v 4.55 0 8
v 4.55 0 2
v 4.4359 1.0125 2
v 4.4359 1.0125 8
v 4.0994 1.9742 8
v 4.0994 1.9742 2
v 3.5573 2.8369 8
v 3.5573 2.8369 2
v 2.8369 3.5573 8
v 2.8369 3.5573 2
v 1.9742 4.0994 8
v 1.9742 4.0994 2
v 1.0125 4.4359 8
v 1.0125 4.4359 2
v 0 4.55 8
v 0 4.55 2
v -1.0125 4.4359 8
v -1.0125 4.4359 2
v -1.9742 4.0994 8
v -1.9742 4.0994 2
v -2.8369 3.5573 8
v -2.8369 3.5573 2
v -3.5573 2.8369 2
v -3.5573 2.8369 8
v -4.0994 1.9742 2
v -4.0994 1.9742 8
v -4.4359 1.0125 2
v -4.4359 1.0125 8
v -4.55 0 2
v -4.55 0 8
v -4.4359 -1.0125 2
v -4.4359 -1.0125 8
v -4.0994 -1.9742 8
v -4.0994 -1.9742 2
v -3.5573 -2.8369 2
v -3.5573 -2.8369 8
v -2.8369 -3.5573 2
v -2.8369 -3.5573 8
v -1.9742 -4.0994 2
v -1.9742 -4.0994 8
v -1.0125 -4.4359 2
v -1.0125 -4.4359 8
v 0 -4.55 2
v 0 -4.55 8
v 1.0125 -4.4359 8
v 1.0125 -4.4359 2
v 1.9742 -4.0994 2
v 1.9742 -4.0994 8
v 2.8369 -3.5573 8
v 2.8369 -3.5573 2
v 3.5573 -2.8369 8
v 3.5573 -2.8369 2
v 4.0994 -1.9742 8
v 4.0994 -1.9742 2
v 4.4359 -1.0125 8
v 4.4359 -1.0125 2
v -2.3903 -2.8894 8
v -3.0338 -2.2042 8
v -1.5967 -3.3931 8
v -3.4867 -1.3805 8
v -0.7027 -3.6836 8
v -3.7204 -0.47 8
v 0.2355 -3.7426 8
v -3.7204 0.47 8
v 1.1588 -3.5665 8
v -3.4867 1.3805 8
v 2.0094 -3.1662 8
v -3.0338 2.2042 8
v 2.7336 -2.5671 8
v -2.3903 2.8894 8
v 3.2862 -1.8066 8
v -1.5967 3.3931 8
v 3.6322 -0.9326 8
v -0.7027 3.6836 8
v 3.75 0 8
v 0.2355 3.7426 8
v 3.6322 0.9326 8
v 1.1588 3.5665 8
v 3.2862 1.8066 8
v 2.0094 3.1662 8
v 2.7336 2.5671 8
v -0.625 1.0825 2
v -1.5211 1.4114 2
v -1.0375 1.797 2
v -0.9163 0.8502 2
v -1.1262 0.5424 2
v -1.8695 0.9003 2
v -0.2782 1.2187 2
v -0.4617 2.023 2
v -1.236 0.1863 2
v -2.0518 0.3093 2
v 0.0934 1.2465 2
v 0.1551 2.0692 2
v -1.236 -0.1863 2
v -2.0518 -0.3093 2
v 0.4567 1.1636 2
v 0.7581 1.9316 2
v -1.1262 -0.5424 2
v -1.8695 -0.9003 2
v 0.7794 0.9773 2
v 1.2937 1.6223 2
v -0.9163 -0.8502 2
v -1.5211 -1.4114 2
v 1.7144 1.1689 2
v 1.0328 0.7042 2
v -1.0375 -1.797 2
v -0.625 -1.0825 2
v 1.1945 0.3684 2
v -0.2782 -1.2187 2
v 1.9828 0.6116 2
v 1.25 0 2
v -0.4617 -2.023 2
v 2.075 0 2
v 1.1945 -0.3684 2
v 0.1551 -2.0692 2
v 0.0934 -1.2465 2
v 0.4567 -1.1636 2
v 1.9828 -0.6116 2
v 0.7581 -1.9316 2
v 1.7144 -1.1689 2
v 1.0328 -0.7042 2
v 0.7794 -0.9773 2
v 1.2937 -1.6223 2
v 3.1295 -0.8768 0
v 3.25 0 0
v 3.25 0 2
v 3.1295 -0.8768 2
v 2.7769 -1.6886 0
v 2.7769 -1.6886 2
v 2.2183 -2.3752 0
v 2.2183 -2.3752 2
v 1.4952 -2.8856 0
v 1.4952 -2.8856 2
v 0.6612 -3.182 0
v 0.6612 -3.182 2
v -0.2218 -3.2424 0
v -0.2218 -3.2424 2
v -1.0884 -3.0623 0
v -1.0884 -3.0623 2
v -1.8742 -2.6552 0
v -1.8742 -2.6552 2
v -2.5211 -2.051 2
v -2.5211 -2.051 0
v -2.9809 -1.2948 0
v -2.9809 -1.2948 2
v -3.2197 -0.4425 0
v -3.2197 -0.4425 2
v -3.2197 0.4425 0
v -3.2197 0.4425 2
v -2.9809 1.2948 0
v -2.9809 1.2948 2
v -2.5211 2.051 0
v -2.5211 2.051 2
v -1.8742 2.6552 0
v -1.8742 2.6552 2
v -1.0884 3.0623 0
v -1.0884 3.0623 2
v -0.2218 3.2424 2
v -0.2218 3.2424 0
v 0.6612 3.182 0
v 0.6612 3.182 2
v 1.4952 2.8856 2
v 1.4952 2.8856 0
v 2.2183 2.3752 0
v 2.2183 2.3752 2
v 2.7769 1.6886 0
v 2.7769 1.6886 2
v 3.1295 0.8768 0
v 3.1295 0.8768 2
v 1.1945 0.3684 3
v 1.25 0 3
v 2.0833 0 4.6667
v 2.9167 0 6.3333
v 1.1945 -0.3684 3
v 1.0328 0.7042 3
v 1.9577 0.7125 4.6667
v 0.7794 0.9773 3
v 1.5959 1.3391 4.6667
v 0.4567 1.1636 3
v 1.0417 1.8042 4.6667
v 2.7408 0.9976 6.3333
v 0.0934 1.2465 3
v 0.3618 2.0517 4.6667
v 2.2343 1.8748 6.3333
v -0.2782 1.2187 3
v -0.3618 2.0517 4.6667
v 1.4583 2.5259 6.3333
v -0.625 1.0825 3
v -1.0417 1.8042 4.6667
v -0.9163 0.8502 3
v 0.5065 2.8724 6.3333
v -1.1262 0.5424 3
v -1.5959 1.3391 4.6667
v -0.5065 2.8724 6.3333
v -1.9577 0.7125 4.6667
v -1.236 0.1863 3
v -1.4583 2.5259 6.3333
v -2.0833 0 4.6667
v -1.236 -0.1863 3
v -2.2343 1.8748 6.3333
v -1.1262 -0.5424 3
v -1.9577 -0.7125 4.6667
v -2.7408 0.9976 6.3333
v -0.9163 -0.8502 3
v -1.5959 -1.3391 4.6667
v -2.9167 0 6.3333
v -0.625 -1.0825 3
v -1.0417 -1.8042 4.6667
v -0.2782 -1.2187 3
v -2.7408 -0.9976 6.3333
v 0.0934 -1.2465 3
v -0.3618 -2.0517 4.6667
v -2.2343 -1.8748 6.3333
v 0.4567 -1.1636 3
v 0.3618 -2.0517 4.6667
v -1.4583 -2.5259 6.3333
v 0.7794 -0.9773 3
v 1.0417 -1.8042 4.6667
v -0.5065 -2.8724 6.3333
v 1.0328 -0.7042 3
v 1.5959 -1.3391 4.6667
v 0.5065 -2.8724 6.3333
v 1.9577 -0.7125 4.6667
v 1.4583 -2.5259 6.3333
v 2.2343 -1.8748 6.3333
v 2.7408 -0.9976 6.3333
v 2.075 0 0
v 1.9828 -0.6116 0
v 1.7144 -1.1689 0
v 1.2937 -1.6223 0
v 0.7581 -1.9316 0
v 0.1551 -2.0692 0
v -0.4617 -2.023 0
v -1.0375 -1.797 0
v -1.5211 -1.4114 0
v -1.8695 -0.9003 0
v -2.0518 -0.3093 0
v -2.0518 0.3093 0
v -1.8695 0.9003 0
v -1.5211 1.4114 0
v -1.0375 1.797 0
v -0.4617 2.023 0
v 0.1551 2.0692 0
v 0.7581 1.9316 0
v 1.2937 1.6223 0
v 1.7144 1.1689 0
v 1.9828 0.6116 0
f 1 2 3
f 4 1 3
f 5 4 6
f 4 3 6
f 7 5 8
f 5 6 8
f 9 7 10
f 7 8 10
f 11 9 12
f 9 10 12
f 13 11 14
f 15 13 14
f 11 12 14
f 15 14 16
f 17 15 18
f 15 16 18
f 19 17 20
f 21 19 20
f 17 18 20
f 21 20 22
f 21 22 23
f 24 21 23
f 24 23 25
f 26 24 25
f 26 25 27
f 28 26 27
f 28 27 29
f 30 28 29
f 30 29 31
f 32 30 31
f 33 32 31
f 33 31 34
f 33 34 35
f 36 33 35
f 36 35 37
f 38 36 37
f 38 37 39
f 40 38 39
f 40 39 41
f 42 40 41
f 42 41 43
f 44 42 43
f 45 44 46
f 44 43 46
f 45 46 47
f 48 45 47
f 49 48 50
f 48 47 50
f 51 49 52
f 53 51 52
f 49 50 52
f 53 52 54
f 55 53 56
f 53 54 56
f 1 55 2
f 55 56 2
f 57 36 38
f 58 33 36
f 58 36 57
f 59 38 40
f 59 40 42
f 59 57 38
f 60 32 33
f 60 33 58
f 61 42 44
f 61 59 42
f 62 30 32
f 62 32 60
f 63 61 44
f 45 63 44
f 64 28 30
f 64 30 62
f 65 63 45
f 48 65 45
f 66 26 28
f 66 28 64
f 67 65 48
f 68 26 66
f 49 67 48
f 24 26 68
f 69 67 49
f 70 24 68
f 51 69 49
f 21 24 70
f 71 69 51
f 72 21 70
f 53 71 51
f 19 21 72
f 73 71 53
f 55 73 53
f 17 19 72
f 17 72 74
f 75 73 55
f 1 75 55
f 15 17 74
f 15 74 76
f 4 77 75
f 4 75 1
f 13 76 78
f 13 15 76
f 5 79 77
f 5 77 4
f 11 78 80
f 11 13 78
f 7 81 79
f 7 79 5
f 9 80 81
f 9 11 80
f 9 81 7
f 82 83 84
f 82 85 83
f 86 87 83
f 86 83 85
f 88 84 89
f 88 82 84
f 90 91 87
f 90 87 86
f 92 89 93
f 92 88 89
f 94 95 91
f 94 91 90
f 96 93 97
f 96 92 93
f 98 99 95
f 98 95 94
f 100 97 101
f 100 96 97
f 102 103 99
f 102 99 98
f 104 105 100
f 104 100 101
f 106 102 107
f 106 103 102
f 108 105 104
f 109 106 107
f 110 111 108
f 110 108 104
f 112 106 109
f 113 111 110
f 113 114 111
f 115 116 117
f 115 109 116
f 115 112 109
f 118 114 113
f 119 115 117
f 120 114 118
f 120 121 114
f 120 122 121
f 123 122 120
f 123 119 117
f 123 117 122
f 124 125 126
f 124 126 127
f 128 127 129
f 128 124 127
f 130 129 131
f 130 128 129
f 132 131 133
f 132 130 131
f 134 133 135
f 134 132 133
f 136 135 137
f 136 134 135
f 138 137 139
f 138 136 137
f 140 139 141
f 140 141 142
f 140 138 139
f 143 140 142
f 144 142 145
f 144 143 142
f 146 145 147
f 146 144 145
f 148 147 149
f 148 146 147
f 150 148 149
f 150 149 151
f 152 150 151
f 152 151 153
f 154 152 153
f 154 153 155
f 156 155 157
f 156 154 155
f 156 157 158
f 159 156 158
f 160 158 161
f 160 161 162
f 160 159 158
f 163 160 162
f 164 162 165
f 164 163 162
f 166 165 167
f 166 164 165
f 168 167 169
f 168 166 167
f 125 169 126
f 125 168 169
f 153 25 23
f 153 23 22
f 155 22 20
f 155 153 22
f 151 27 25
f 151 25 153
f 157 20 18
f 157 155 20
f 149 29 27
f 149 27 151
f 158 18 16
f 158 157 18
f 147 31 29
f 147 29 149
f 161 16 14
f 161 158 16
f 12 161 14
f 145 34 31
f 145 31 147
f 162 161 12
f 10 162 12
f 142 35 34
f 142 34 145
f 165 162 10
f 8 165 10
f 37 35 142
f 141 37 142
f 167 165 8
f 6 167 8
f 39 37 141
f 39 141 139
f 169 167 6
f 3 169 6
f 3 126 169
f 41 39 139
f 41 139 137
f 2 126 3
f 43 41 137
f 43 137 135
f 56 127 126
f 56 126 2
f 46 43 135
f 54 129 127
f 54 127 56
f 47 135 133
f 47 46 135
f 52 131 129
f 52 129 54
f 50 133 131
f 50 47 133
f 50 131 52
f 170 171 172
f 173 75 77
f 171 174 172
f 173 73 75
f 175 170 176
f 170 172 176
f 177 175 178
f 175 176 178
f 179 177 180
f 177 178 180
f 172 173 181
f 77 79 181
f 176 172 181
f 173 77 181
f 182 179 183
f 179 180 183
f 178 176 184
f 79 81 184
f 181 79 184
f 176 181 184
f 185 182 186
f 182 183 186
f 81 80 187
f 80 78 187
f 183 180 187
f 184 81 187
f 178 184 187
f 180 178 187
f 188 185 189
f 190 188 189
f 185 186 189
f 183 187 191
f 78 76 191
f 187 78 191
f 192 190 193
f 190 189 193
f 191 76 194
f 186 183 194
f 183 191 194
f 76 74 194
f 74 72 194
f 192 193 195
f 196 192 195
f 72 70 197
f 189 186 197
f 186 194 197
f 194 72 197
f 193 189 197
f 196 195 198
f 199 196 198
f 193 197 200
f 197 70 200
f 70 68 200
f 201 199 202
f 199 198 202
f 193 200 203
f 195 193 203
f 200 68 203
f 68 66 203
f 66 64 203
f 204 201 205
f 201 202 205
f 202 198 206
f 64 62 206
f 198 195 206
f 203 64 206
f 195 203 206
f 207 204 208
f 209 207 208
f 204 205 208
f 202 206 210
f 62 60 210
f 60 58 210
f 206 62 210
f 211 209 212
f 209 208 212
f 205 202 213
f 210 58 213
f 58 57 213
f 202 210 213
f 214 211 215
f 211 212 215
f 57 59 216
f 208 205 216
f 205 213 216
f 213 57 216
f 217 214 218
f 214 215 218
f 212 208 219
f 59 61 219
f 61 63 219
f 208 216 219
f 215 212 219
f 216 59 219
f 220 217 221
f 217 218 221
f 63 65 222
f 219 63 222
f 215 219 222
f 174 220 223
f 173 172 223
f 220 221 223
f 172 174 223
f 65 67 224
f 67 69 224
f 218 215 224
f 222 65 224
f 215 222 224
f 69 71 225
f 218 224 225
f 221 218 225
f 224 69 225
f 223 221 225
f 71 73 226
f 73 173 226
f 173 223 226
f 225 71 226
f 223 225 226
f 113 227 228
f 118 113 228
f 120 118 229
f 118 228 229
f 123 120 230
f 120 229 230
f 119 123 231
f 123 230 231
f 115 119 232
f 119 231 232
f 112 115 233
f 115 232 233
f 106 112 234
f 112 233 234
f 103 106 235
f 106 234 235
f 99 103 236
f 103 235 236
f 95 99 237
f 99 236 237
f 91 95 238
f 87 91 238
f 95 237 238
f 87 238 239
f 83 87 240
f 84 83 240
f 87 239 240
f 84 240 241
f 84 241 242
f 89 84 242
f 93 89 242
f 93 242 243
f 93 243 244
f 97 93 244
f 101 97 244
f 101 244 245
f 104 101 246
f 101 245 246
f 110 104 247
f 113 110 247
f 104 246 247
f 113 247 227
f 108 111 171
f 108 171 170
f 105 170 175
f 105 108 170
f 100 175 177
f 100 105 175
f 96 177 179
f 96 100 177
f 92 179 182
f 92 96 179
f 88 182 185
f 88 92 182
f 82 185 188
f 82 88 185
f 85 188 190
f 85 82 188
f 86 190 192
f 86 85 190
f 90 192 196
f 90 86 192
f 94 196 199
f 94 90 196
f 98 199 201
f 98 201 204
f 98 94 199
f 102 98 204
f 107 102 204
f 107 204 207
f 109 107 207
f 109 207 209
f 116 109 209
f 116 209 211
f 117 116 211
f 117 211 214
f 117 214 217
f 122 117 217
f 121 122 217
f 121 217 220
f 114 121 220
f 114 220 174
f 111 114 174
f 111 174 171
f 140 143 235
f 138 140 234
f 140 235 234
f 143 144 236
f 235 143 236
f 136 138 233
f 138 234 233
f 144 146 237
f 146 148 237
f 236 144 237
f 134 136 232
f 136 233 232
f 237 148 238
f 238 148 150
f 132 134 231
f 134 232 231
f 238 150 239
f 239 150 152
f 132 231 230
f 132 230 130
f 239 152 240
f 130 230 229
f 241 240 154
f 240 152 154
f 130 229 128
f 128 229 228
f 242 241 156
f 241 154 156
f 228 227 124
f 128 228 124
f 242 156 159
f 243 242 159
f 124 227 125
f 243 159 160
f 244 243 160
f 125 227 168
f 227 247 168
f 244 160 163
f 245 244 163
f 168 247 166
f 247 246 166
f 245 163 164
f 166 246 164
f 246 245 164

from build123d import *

# Parameters (mm, degrees)
F0_R     = 4.55
F0_R_2   = 1.25
F1_DEPTH = 8
F2_SIZE2 = 2.5
F2_SIZE  = 5
F3_R     = 4.55
F3_R_2   = 3.25
F3_R_3   = 2.075
F3_R_4   = 1.25
F4_DEPTH = 2


with BuildPart() as f1:
    # F0 (on Top) → F1 (new body)
    with BuildSketch(Plane.XY):
        Circle(F0_R)
        Circle(F0_R_2, mode=Mode.SUBTRACT)
    extrude(amount=F1_DEPTH)

    # F2
    f2_edges = [f1.edges().sort_by_distance(p)[0] for p in [
        (-1.25, 0, 8),
    ]]
    f2_side = f1.faces().sort_by_distance((-1.25, 0, 4))[0]
    chamfer(f2_edges, length=F2_SIZE, length2=F2_SIZE2, reference=f2_side)

    # F3 (on face) → F4 (cut)
    with BuildSketch(Plane(origin=(0, 0, 0), x_dir=(1, 0, 0), z_dir=(0, 0, -1))):
        Circle(F3_R)
        Circle(F3_R_2, mode=Mode.SUBTRACT)
        Circle(F3_R_3)
        Circle(F3_R_4, mode=Mode.SUBTRACT)
    extrude(amount=-F4_DEPTH, mode=Mode.SUBTRACT)


solid = f1.part
